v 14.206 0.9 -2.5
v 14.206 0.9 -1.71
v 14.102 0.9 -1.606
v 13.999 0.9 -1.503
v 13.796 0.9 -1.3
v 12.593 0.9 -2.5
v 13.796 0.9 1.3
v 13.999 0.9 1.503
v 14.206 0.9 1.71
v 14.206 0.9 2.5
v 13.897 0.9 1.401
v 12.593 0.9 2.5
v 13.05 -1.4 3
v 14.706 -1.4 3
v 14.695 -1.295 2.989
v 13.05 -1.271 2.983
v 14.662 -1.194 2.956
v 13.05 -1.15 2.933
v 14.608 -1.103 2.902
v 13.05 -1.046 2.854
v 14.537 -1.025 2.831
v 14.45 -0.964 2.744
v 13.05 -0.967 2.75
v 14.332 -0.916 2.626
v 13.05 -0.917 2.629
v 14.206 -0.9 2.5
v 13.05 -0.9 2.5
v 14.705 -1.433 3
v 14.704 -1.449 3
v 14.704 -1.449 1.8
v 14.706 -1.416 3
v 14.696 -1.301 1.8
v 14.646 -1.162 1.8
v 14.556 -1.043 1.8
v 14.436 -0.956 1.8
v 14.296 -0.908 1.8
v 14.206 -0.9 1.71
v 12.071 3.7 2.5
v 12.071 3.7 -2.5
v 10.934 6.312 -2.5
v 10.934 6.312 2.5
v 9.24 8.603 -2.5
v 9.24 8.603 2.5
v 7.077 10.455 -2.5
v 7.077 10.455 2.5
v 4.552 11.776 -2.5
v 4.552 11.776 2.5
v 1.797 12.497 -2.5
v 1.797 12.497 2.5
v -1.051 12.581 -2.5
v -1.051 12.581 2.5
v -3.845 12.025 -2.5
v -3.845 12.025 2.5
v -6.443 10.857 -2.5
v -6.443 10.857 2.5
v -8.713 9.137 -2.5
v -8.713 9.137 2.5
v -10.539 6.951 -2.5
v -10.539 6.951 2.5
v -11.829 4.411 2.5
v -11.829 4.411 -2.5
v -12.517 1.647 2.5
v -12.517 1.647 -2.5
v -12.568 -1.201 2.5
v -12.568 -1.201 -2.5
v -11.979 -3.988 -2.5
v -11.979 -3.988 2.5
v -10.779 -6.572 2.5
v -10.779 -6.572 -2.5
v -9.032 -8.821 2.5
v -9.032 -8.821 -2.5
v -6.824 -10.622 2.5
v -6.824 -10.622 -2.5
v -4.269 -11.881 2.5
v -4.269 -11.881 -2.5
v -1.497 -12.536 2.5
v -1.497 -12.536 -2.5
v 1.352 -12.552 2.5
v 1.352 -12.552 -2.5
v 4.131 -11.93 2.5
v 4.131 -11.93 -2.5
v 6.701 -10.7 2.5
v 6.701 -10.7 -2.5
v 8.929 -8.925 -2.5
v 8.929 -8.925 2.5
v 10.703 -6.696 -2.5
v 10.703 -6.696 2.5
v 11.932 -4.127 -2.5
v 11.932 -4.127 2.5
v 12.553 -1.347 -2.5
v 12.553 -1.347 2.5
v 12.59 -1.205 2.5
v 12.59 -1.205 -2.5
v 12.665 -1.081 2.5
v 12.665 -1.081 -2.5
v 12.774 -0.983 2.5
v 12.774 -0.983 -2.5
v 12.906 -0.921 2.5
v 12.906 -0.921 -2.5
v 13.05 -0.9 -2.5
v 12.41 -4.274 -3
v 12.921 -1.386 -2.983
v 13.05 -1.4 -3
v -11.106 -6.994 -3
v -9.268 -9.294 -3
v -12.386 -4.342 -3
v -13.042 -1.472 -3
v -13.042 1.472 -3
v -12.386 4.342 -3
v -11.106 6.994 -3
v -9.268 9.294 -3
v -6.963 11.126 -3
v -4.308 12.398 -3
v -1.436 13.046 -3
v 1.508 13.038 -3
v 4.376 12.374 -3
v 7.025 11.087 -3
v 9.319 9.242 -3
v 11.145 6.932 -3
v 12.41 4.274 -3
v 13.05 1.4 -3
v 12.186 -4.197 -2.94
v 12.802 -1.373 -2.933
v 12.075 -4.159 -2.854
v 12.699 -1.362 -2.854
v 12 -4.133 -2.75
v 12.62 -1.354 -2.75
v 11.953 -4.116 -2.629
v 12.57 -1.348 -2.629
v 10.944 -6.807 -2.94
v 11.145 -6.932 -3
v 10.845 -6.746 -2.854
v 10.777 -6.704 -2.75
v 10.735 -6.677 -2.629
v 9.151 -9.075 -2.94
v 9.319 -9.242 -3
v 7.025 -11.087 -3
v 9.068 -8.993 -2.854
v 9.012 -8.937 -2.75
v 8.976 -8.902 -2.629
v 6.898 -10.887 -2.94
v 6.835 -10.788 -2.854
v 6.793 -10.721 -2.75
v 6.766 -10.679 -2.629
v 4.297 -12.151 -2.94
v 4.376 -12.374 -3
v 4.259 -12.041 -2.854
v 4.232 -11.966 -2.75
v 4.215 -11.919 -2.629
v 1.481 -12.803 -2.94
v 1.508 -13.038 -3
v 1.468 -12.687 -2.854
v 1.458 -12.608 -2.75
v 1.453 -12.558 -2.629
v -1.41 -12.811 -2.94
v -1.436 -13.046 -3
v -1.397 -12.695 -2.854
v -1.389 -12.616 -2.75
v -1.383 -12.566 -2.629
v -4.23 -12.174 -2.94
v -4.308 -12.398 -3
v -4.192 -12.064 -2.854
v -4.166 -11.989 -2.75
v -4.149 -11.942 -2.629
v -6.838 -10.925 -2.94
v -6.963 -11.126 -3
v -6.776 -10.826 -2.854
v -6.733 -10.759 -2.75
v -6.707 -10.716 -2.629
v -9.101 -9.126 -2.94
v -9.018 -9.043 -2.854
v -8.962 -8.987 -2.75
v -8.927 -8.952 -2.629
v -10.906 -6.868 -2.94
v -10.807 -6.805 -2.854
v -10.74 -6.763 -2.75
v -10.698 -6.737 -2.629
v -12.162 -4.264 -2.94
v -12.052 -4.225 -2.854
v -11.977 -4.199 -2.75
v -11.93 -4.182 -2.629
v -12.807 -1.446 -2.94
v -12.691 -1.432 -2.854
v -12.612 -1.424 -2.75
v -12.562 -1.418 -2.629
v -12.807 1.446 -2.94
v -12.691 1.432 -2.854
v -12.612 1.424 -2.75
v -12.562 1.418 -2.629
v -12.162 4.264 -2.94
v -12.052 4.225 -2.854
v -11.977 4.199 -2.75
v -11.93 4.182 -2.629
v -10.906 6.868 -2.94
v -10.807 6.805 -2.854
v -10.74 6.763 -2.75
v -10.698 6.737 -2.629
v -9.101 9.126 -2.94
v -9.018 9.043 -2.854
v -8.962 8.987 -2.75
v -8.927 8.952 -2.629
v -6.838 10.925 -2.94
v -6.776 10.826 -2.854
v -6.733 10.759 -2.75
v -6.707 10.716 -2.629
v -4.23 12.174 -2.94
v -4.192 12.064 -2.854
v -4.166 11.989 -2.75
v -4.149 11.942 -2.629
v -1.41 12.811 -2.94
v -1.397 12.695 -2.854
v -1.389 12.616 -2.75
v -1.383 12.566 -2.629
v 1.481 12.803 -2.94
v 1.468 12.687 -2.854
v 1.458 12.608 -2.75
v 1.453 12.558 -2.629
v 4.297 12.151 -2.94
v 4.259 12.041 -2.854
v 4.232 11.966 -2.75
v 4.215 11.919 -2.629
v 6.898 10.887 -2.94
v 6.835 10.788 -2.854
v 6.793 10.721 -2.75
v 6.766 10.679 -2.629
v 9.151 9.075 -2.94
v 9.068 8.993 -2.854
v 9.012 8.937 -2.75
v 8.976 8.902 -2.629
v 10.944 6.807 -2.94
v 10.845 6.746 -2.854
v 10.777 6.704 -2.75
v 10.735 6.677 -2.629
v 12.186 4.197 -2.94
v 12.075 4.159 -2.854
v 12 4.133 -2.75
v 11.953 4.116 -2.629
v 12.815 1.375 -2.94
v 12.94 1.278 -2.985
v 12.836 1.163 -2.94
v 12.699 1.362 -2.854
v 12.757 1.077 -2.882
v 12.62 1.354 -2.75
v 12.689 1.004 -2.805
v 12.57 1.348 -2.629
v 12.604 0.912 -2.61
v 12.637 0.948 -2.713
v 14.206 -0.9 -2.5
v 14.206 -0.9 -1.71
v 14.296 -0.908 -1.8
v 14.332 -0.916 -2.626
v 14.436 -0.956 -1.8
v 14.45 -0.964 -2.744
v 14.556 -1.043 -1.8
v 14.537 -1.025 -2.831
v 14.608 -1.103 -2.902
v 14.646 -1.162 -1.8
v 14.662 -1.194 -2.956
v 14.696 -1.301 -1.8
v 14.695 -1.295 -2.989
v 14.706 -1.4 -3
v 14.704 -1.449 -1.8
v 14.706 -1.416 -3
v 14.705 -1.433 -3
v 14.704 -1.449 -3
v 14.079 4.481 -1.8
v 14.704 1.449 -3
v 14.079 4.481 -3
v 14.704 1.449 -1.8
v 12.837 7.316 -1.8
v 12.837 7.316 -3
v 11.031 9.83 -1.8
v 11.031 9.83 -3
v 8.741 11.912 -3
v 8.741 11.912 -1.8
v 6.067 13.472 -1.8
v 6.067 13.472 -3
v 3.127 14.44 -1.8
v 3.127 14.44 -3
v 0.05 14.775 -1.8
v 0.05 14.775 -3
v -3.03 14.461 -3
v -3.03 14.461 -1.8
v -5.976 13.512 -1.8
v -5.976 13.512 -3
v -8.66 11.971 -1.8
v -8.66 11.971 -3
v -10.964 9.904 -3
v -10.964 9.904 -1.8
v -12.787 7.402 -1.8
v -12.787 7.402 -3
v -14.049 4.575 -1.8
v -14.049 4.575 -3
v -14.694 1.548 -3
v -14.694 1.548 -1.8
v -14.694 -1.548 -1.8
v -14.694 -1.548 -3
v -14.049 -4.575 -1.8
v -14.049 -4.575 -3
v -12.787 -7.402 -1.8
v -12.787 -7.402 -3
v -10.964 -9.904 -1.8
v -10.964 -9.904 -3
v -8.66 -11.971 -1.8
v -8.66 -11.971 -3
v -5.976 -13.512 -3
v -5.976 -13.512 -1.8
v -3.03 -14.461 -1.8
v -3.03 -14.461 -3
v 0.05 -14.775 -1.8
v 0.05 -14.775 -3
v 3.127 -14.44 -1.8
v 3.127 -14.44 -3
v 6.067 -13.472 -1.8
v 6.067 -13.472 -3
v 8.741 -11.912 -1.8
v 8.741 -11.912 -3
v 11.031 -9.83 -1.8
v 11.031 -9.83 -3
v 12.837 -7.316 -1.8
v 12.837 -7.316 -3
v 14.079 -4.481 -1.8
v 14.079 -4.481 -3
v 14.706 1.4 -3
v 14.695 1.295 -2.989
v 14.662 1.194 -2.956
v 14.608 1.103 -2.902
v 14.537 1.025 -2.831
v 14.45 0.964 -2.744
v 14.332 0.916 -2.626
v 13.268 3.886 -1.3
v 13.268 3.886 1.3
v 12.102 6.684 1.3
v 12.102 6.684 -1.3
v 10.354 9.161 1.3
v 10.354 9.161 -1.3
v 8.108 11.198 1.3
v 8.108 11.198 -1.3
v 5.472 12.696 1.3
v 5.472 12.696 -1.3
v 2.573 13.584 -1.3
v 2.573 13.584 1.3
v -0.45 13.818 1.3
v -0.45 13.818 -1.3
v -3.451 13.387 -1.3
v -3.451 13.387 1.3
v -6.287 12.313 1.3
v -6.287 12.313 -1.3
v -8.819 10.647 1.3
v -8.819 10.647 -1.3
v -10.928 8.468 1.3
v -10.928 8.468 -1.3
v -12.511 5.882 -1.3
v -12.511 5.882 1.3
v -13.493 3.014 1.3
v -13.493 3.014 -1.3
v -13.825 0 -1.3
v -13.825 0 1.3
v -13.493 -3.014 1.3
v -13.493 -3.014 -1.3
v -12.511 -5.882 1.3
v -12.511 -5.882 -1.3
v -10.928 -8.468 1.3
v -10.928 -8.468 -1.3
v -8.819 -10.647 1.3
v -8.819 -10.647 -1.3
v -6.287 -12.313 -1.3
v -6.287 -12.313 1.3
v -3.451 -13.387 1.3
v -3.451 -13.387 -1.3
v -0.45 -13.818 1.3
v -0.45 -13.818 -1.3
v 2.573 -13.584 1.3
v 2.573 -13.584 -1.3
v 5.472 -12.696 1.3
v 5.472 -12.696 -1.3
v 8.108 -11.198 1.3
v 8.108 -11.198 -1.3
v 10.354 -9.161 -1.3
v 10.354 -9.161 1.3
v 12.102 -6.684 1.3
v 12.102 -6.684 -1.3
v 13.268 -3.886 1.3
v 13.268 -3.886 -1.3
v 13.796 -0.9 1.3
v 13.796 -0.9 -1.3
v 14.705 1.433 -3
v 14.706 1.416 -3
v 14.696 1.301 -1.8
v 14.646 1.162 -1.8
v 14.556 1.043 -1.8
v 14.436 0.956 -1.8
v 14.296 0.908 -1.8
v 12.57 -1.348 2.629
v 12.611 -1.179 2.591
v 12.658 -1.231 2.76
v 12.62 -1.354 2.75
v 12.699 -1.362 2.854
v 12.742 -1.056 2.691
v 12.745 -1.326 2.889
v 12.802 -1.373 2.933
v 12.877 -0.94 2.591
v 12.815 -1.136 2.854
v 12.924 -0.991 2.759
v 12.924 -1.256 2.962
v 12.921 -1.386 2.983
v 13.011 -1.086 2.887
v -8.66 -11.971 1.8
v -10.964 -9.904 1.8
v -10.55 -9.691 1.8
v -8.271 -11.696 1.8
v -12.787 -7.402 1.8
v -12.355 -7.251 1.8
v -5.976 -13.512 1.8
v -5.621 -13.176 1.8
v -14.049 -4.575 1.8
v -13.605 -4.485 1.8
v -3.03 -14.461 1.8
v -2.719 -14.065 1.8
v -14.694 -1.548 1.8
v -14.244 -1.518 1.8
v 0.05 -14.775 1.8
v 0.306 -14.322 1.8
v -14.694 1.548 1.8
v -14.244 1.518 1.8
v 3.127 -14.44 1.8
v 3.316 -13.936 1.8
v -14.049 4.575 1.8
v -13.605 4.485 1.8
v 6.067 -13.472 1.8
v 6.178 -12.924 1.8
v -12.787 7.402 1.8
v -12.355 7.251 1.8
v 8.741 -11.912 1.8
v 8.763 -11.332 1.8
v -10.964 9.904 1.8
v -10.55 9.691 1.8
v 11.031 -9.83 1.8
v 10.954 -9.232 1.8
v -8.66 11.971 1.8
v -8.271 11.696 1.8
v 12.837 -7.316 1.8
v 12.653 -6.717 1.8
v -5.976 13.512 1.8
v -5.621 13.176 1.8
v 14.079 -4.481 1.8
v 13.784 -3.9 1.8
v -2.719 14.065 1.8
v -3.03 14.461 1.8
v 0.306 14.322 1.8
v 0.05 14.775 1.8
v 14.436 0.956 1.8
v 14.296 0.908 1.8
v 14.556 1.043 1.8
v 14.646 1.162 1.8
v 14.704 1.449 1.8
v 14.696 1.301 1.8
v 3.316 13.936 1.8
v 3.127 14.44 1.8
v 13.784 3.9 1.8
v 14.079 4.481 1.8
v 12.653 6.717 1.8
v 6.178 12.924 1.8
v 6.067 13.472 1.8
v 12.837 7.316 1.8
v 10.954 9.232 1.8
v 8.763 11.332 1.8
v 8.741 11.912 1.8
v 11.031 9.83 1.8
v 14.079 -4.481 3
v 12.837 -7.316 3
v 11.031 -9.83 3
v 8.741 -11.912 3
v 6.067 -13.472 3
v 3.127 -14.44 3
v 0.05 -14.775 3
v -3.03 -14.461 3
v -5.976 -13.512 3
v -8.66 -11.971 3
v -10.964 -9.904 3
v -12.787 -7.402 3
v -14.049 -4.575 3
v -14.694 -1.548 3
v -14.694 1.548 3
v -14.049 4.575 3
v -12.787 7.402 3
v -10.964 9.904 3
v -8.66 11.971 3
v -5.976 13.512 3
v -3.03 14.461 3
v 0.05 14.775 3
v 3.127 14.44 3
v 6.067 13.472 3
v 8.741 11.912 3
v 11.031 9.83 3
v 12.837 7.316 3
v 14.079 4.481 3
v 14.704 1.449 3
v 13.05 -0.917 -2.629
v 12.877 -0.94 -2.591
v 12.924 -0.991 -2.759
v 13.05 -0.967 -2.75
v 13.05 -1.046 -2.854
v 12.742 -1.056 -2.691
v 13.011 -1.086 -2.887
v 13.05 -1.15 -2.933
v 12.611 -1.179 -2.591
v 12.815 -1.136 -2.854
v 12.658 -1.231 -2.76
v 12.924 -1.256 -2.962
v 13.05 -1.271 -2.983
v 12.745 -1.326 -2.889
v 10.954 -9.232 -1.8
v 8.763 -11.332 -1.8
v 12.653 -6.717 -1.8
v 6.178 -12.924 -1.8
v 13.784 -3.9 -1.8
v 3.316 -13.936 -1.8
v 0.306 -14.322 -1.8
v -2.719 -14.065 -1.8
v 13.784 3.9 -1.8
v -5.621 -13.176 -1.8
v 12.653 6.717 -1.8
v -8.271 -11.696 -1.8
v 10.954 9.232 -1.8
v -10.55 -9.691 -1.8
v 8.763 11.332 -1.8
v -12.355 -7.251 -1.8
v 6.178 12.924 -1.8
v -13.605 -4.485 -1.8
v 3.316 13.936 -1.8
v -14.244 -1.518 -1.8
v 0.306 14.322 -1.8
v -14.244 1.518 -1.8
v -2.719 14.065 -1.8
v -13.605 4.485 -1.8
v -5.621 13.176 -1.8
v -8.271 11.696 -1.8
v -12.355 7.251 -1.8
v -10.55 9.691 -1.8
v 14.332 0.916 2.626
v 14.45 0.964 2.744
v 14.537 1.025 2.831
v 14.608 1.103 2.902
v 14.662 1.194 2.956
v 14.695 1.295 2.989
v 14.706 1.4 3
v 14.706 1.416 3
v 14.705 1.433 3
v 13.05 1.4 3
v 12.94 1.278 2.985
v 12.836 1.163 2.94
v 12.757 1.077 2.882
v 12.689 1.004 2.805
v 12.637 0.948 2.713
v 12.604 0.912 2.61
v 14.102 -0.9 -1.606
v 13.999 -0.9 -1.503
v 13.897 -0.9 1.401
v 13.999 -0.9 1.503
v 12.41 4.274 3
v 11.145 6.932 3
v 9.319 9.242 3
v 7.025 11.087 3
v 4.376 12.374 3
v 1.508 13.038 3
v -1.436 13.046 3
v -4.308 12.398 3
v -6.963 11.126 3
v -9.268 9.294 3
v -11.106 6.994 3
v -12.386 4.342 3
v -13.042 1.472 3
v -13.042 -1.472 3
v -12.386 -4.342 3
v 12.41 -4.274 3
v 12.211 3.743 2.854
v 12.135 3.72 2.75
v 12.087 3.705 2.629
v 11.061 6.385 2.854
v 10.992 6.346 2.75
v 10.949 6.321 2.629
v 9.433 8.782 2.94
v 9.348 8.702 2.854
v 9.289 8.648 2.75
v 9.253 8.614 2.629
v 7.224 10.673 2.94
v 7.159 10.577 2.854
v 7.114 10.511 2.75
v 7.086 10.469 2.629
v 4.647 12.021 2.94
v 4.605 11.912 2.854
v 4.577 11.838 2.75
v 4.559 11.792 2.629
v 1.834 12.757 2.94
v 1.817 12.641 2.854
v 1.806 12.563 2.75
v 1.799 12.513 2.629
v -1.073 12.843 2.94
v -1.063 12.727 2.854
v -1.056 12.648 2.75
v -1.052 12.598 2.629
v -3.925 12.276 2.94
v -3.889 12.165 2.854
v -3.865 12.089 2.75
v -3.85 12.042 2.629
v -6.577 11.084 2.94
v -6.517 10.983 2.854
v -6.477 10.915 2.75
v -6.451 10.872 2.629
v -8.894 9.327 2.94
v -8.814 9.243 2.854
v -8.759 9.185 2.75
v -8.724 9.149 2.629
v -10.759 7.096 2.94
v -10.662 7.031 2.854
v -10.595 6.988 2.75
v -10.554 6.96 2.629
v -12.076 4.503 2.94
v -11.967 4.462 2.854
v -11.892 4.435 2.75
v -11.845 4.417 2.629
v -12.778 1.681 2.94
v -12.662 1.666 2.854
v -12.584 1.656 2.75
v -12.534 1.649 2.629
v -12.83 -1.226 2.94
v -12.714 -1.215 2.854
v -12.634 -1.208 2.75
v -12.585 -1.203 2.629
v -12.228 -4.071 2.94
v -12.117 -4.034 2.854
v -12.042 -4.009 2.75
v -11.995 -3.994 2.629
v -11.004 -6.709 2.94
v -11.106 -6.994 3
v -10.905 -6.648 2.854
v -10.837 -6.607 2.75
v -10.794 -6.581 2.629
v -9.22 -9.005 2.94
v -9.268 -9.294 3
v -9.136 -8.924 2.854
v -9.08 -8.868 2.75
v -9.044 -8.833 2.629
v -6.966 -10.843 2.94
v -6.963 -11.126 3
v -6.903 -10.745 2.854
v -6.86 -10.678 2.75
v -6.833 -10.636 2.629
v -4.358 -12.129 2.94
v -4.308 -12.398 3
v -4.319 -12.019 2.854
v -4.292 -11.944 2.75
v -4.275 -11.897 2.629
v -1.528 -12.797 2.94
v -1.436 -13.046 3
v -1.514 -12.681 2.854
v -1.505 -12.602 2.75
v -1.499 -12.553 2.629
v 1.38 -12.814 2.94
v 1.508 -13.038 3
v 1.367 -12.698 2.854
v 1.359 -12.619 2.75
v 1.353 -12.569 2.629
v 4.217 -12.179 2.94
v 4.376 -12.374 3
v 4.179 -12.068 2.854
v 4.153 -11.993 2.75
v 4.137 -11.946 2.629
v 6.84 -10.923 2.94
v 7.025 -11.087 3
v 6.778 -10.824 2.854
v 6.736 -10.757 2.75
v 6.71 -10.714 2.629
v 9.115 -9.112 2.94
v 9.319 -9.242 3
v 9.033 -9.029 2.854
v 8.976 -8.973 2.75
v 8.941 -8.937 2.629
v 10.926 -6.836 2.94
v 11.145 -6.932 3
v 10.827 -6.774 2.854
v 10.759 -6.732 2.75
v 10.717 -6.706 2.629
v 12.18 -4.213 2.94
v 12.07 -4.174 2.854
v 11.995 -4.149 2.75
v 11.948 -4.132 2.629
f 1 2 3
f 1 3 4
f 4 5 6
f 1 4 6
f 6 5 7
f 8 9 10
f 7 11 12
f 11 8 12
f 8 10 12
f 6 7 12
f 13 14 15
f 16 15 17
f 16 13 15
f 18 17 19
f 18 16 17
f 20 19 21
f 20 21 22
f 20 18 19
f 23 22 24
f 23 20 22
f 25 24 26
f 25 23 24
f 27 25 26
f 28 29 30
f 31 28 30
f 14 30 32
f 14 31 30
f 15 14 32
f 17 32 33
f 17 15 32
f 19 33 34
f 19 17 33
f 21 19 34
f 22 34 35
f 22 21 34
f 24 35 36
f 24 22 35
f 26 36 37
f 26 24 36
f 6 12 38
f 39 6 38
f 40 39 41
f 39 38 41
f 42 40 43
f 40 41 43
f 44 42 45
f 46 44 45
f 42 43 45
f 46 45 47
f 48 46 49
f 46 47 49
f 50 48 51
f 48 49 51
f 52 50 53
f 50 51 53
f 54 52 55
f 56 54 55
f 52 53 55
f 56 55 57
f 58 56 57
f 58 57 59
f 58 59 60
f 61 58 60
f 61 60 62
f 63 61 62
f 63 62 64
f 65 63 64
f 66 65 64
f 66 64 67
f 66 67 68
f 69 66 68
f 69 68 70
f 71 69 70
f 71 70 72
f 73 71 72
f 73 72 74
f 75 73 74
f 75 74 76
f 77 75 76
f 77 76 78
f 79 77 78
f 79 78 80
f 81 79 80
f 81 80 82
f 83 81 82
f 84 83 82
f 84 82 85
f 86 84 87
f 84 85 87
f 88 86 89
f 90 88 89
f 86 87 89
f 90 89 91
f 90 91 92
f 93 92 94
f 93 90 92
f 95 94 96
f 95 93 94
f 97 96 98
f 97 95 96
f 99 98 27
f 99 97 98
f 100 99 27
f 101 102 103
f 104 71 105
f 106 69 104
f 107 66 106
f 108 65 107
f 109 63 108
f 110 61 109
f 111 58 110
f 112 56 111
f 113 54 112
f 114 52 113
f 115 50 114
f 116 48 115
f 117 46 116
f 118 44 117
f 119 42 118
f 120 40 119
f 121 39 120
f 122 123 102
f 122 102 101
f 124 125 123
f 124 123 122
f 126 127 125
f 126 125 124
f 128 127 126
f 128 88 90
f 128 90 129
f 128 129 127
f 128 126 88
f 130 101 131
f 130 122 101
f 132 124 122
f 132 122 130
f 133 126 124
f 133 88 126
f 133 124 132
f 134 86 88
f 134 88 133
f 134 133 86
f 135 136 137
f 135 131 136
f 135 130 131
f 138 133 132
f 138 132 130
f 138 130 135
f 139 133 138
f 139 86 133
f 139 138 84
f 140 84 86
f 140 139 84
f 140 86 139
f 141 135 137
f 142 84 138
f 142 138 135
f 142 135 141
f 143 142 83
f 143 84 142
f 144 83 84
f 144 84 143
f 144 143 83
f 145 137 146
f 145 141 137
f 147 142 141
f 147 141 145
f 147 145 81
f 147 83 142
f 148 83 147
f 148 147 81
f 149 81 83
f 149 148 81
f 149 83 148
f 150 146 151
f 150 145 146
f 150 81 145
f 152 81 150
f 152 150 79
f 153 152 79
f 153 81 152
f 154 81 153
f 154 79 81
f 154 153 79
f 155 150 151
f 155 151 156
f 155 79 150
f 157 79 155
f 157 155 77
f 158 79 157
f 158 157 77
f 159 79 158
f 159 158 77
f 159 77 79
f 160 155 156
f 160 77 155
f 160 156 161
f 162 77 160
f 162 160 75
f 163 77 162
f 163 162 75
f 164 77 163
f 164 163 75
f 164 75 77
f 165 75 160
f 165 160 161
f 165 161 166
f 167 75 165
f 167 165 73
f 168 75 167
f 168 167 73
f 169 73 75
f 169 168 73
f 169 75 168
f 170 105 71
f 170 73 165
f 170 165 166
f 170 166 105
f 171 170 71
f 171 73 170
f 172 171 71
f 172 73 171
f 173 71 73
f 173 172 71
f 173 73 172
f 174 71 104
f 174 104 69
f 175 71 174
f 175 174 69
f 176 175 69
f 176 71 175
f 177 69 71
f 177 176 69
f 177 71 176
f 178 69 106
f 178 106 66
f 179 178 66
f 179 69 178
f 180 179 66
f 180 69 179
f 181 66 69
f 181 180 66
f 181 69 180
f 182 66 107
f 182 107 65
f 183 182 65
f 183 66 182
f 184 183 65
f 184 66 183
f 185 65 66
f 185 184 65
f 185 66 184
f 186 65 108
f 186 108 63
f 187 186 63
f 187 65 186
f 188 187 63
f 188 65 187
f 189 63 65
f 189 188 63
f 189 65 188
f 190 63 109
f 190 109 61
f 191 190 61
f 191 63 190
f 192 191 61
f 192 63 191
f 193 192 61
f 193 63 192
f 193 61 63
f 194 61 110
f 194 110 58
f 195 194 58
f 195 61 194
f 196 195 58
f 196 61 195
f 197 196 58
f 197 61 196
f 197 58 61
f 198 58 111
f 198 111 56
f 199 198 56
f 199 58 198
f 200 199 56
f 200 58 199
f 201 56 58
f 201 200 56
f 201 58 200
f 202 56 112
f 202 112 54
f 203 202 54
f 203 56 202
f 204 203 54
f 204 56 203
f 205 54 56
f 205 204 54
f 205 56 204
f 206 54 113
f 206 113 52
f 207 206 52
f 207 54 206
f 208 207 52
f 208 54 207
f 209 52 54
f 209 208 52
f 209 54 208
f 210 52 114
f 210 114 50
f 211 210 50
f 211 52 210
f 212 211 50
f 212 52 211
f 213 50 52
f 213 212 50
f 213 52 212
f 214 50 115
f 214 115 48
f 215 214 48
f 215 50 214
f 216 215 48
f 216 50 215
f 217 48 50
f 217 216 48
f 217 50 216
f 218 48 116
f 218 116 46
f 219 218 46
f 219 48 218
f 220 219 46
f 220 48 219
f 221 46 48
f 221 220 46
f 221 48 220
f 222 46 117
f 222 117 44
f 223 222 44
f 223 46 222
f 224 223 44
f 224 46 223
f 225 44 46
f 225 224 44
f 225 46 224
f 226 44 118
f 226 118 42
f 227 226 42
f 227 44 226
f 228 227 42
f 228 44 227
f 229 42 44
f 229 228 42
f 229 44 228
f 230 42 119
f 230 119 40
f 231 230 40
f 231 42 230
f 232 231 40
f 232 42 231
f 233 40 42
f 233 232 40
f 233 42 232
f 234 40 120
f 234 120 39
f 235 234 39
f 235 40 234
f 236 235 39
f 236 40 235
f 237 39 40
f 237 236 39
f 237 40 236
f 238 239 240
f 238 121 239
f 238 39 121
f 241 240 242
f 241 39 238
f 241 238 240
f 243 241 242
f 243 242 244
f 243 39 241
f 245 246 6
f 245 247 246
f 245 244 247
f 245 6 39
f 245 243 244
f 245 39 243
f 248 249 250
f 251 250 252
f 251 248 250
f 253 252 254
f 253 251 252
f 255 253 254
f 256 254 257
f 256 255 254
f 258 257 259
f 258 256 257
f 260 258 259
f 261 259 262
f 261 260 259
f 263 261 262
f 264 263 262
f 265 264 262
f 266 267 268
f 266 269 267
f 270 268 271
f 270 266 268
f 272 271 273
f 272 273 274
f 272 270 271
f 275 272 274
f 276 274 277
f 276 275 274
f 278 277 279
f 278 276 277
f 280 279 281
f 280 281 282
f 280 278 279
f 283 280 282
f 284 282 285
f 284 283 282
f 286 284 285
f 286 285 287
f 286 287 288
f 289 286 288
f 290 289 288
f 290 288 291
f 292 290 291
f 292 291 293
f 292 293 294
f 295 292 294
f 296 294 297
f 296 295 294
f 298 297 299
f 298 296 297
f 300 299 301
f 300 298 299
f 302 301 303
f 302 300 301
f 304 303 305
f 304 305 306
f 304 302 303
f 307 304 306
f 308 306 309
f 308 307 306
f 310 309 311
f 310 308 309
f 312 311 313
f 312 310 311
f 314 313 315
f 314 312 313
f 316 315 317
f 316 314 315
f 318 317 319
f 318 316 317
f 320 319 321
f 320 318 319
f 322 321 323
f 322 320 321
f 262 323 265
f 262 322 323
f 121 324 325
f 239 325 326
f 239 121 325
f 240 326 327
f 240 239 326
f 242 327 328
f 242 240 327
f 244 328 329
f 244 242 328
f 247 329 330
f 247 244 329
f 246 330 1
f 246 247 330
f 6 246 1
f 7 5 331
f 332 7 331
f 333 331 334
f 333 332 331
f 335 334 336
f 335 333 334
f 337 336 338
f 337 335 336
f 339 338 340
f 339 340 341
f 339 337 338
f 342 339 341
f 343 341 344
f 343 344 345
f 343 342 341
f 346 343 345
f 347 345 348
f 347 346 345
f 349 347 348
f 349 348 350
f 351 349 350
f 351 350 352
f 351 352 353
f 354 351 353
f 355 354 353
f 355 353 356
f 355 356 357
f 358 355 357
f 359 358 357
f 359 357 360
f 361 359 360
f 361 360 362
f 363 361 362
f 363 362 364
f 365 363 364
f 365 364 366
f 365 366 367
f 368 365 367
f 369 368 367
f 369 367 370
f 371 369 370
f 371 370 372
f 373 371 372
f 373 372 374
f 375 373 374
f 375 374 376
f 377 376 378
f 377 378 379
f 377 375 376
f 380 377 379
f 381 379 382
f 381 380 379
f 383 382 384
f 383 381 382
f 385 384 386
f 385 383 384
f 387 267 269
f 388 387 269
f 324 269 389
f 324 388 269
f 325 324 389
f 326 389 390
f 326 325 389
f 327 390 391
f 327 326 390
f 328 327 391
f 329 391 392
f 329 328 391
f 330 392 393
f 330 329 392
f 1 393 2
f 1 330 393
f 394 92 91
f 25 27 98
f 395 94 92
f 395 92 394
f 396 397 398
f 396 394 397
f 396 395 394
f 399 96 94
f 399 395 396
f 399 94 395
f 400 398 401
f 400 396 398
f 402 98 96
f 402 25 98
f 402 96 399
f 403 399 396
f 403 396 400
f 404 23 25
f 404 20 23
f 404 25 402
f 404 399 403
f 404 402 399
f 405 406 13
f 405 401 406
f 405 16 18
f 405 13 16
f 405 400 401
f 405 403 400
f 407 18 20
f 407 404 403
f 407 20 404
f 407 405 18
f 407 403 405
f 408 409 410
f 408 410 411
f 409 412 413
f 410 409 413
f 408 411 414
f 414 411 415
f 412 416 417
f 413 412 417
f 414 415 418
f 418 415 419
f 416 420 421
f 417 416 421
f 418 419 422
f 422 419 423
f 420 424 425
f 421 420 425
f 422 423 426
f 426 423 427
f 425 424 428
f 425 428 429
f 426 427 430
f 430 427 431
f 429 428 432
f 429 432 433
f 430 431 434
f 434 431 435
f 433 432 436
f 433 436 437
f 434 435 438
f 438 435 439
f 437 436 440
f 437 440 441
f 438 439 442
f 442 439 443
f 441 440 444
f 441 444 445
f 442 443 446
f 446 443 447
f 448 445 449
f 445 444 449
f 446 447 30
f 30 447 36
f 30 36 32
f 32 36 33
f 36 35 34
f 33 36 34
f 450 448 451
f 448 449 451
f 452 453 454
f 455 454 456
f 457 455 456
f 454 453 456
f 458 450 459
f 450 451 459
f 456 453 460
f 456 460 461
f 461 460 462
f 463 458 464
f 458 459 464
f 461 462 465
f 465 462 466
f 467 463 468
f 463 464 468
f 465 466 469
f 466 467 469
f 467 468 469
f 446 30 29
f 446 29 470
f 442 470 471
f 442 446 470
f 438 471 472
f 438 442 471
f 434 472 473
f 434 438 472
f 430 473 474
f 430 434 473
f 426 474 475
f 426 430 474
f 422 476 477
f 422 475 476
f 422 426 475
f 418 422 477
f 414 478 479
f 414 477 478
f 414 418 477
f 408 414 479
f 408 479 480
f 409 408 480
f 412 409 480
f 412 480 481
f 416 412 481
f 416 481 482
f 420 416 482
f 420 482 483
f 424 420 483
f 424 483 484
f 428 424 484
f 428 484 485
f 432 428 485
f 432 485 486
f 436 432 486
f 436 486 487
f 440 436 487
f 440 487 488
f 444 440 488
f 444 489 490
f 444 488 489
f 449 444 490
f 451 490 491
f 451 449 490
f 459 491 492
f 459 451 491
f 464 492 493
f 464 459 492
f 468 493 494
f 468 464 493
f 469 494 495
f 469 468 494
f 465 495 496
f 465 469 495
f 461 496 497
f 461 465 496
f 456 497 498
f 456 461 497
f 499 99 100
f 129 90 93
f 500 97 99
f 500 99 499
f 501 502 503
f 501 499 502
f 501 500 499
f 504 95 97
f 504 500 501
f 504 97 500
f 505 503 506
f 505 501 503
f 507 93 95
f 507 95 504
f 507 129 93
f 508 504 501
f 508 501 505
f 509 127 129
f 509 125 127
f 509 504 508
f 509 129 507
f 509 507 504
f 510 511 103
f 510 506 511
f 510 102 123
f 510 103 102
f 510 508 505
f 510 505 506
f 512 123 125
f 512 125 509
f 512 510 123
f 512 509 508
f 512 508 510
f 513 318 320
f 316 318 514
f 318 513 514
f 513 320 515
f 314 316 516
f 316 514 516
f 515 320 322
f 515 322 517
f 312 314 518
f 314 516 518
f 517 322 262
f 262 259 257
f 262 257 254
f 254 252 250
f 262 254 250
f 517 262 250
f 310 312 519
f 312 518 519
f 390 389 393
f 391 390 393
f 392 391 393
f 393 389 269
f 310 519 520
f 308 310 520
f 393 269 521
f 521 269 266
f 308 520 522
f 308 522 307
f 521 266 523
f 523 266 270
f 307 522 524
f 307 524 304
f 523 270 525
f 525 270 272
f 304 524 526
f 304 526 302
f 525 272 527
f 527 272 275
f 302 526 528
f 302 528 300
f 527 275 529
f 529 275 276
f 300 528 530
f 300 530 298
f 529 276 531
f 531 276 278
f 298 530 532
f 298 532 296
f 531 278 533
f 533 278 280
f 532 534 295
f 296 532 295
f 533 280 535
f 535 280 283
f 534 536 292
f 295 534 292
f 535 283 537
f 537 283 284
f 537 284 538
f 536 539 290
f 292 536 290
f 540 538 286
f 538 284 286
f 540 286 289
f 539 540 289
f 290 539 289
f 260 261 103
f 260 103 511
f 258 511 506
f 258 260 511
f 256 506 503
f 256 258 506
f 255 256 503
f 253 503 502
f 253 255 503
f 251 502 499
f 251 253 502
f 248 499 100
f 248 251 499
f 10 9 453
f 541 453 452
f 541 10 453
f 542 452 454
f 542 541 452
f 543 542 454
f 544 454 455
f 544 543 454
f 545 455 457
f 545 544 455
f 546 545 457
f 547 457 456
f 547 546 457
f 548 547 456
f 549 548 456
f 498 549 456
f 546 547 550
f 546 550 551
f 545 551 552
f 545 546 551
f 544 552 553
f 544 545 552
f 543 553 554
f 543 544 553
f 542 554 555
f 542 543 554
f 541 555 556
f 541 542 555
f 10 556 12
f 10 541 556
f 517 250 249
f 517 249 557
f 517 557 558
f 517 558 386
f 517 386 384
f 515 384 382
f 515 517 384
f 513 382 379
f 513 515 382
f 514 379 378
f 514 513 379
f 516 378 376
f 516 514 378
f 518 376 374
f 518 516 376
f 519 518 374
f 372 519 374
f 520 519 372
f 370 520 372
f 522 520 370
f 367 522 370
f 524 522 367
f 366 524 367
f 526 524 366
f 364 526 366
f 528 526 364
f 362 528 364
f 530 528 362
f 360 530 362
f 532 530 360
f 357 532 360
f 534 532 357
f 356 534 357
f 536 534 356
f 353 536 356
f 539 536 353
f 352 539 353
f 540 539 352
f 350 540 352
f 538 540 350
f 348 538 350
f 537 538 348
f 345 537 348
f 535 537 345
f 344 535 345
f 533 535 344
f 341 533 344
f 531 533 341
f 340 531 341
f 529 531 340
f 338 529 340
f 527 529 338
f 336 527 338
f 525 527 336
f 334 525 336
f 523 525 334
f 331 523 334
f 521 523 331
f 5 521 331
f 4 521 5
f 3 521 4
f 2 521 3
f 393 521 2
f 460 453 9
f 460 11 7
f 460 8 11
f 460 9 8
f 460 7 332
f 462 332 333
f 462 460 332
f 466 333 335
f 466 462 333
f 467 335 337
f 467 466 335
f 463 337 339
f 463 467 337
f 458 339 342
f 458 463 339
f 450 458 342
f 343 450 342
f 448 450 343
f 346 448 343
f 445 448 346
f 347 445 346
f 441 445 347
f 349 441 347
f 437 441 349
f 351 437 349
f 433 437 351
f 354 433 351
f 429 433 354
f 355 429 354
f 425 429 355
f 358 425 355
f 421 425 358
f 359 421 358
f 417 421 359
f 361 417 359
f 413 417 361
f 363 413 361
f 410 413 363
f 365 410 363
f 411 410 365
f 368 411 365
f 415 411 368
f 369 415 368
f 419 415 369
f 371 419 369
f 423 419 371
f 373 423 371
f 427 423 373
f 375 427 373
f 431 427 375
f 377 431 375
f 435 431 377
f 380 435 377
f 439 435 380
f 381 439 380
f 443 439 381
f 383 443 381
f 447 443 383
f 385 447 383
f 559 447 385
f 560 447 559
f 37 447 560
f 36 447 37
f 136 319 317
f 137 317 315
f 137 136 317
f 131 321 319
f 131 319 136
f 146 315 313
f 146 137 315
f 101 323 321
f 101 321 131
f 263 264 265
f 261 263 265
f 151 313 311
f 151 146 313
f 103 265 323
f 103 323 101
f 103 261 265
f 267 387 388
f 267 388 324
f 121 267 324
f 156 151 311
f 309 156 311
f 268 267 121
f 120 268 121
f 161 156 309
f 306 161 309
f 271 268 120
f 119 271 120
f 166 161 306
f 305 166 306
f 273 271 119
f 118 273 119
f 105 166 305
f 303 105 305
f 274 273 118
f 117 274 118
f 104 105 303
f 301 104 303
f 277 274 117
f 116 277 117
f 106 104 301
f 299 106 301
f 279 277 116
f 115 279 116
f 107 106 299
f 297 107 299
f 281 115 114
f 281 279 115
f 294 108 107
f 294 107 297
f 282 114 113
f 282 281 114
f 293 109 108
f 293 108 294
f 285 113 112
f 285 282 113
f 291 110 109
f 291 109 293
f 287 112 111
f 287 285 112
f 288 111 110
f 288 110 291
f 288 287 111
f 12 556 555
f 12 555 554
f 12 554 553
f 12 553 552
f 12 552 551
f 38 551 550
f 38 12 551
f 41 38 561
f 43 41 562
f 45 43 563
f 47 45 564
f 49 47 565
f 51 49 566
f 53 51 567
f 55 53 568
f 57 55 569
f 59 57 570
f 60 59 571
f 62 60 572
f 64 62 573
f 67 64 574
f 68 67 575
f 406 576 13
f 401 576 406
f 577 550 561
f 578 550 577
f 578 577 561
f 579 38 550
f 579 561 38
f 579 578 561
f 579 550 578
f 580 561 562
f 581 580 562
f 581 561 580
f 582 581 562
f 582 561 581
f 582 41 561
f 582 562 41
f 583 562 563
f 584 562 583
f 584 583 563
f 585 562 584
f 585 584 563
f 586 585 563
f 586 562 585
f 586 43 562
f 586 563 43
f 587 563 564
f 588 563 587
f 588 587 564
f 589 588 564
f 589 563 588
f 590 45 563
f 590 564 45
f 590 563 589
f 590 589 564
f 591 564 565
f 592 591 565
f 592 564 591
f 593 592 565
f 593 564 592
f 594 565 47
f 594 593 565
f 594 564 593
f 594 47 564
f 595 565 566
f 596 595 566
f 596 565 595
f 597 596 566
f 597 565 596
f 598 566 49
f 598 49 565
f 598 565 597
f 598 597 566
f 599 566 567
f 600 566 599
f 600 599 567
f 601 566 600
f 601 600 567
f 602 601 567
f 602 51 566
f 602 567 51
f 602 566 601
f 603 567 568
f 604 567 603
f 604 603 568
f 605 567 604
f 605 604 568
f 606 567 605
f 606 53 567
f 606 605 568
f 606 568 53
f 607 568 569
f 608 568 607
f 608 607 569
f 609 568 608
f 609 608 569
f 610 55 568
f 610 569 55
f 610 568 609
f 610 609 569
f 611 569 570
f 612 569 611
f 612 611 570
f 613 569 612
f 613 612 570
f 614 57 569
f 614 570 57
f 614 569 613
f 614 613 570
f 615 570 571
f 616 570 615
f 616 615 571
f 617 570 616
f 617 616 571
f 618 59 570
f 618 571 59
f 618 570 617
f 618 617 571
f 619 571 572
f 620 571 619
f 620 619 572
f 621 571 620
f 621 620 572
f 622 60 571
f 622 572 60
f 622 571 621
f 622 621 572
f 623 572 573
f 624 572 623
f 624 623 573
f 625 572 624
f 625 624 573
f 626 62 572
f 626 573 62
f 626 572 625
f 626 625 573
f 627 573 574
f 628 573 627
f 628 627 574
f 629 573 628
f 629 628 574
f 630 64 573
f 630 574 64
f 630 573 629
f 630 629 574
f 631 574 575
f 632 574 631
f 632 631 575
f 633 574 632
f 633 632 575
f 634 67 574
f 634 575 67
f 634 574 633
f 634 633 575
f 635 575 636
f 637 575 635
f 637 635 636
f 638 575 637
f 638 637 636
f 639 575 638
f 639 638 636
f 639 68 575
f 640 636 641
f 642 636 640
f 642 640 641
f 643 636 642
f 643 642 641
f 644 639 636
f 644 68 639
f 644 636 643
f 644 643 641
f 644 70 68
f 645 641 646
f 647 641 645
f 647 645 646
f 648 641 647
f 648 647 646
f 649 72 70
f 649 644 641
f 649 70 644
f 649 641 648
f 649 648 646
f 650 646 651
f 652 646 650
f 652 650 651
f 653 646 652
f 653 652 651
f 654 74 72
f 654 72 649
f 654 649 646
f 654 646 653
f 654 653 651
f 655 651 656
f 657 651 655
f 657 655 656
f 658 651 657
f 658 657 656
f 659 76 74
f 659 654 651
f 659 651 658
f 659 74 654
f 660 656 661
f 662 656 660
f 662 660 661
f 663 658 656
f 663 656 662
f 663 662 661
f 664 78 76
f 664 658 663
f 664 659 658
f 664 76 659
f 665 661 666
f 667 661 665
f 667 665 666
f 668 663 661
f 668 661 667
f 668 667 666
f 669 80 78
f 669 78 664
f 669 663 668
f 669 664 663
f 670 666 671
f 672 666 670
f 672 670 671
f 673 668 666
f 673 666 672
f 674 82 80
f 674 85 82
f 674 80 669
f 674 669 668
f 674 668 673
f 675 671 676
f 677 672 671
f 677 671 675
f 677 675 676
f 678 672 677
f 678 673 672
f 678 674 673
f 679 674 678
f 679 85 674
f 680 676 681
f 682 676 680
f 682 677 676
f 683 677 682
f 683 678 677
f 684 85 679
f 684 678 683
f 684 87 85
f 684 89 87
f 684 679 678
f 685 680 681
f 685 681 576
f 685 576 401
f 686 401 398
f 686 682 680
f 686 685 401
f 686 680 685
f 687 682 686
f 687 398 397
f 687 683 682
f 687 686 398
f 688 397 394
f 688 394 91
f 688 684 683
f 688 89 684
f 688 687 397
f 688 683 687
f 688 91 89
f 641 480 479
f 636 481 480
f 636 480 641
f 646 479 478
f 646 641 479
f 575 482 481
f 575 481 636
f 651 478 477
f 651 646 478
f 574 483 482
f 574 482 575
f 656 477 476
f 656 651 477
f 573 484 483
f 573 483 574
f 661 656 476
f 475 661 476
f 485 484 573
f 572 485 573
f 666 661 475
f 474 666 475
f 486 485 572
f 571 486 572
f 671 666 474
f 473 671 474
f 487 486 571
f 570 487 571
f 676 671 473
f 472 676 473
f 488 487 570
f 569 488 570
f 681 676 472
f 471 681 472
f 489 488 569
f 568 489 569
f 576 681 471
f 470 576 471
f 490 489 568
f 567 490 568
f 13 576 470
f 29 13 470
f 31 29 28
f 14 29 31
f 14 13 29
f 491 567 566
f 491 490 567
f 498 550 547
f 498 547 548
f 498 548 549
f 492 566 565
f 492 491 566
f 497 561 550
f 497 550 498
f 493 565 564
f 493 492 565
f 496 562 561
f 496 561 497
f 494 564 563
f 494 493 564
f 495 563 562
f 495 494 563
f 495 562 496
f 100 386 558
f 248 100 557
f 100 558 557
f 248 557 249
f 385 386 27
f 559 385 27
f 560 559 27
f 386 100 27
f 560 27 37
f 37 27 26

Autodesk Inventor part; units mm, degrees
ref_plane "YZ Plane" through (0, 0, 0) normal (1, 0, 0) x (0, 1, 0)
ref_plane "XZ Plane" through (0, 0, 0) normal (0, 1, 0) x (-1, 0, 0)
ref_plane "XY Plane" through (0, 0, 0) normal (0, 0, 1) x (1, 0, 0)
sketch "Sketch1" plane through (0, 0, 0) normal (0, 0, 1) x (1, 0, 0)
  circle A0 centre (0, 0) radius 13.825
  circle A1 centre (0, 0) radius 12.625
  dimension "d0" = 27.65
  dimension "d1" = 25.25
extrude "Extrusion1" add sketch "Sketch1" along normal blind 1.8
sketch "Sketch2" plane through (0, 0, 1.8) normal (0, 0, 1) x (1, 0, 0)
  circle A0 centre (0, 0) radius 12.625
  circle A1 centre (0, 0) radius 14.775
  dimension "d5" = 29.55
  dimension "d16" = 25.25
extrude "Extrusion2" add sketch "Sketch2" along normal blind 1.2
sketch "Sketch3" plane through (0, 0, 0) normal (0, 0, 1) x (1, 0, 0)
  line L0 (11.2898, 0.9) -> (17.9351, 0.9)
  line L1 (17.9351, 0.9) -> (17.9351, -0.9)
  line L2 (17.9351, -0.9) -> (11.2898, -0.9)
  line L3 (11.2898, -0.9) -> (11.2898, 0.9)
  point P0 (0, 0)
  dimension "d13" = 1.8
  dimension "d14" = 6.6453
  dimension "d15" = 0.9
extrude "Extrusion3" cut sketch "Sketch3" along normal blind 6
chamfer "Chamfer1" distance 0.5 angle 45 1 edges at (-13.825, 0, 1.8)
mirror "Mirror2" about plane through (0, 0, 0) normal (0, 0, 1) of "Extrusion1", "Extrusion2", "Extrusion3", "Chamfer1"
fillet "Fillet1" radius 0.5 11 edges at (-12.625, 0, 3) (-12.625, 0, -3) (12.5929, -0.9, 0) (13.6702, -0.9, 3) (13.6702, -0.9, -3) (13.6702, 0.9, 3) (13.6702, 0.9, -3) (14.7476, 0.9, 2.4) (14.7476, 0.9, -2.4) (14.7476, -0.9, -2.4) (14.7476, -0.9, 2.4)
equation "\"d16\" = d1"
equation "\"d15\" = 0.5 * d13"
properties part number "maxtubingBoreWireProtectInsert"
